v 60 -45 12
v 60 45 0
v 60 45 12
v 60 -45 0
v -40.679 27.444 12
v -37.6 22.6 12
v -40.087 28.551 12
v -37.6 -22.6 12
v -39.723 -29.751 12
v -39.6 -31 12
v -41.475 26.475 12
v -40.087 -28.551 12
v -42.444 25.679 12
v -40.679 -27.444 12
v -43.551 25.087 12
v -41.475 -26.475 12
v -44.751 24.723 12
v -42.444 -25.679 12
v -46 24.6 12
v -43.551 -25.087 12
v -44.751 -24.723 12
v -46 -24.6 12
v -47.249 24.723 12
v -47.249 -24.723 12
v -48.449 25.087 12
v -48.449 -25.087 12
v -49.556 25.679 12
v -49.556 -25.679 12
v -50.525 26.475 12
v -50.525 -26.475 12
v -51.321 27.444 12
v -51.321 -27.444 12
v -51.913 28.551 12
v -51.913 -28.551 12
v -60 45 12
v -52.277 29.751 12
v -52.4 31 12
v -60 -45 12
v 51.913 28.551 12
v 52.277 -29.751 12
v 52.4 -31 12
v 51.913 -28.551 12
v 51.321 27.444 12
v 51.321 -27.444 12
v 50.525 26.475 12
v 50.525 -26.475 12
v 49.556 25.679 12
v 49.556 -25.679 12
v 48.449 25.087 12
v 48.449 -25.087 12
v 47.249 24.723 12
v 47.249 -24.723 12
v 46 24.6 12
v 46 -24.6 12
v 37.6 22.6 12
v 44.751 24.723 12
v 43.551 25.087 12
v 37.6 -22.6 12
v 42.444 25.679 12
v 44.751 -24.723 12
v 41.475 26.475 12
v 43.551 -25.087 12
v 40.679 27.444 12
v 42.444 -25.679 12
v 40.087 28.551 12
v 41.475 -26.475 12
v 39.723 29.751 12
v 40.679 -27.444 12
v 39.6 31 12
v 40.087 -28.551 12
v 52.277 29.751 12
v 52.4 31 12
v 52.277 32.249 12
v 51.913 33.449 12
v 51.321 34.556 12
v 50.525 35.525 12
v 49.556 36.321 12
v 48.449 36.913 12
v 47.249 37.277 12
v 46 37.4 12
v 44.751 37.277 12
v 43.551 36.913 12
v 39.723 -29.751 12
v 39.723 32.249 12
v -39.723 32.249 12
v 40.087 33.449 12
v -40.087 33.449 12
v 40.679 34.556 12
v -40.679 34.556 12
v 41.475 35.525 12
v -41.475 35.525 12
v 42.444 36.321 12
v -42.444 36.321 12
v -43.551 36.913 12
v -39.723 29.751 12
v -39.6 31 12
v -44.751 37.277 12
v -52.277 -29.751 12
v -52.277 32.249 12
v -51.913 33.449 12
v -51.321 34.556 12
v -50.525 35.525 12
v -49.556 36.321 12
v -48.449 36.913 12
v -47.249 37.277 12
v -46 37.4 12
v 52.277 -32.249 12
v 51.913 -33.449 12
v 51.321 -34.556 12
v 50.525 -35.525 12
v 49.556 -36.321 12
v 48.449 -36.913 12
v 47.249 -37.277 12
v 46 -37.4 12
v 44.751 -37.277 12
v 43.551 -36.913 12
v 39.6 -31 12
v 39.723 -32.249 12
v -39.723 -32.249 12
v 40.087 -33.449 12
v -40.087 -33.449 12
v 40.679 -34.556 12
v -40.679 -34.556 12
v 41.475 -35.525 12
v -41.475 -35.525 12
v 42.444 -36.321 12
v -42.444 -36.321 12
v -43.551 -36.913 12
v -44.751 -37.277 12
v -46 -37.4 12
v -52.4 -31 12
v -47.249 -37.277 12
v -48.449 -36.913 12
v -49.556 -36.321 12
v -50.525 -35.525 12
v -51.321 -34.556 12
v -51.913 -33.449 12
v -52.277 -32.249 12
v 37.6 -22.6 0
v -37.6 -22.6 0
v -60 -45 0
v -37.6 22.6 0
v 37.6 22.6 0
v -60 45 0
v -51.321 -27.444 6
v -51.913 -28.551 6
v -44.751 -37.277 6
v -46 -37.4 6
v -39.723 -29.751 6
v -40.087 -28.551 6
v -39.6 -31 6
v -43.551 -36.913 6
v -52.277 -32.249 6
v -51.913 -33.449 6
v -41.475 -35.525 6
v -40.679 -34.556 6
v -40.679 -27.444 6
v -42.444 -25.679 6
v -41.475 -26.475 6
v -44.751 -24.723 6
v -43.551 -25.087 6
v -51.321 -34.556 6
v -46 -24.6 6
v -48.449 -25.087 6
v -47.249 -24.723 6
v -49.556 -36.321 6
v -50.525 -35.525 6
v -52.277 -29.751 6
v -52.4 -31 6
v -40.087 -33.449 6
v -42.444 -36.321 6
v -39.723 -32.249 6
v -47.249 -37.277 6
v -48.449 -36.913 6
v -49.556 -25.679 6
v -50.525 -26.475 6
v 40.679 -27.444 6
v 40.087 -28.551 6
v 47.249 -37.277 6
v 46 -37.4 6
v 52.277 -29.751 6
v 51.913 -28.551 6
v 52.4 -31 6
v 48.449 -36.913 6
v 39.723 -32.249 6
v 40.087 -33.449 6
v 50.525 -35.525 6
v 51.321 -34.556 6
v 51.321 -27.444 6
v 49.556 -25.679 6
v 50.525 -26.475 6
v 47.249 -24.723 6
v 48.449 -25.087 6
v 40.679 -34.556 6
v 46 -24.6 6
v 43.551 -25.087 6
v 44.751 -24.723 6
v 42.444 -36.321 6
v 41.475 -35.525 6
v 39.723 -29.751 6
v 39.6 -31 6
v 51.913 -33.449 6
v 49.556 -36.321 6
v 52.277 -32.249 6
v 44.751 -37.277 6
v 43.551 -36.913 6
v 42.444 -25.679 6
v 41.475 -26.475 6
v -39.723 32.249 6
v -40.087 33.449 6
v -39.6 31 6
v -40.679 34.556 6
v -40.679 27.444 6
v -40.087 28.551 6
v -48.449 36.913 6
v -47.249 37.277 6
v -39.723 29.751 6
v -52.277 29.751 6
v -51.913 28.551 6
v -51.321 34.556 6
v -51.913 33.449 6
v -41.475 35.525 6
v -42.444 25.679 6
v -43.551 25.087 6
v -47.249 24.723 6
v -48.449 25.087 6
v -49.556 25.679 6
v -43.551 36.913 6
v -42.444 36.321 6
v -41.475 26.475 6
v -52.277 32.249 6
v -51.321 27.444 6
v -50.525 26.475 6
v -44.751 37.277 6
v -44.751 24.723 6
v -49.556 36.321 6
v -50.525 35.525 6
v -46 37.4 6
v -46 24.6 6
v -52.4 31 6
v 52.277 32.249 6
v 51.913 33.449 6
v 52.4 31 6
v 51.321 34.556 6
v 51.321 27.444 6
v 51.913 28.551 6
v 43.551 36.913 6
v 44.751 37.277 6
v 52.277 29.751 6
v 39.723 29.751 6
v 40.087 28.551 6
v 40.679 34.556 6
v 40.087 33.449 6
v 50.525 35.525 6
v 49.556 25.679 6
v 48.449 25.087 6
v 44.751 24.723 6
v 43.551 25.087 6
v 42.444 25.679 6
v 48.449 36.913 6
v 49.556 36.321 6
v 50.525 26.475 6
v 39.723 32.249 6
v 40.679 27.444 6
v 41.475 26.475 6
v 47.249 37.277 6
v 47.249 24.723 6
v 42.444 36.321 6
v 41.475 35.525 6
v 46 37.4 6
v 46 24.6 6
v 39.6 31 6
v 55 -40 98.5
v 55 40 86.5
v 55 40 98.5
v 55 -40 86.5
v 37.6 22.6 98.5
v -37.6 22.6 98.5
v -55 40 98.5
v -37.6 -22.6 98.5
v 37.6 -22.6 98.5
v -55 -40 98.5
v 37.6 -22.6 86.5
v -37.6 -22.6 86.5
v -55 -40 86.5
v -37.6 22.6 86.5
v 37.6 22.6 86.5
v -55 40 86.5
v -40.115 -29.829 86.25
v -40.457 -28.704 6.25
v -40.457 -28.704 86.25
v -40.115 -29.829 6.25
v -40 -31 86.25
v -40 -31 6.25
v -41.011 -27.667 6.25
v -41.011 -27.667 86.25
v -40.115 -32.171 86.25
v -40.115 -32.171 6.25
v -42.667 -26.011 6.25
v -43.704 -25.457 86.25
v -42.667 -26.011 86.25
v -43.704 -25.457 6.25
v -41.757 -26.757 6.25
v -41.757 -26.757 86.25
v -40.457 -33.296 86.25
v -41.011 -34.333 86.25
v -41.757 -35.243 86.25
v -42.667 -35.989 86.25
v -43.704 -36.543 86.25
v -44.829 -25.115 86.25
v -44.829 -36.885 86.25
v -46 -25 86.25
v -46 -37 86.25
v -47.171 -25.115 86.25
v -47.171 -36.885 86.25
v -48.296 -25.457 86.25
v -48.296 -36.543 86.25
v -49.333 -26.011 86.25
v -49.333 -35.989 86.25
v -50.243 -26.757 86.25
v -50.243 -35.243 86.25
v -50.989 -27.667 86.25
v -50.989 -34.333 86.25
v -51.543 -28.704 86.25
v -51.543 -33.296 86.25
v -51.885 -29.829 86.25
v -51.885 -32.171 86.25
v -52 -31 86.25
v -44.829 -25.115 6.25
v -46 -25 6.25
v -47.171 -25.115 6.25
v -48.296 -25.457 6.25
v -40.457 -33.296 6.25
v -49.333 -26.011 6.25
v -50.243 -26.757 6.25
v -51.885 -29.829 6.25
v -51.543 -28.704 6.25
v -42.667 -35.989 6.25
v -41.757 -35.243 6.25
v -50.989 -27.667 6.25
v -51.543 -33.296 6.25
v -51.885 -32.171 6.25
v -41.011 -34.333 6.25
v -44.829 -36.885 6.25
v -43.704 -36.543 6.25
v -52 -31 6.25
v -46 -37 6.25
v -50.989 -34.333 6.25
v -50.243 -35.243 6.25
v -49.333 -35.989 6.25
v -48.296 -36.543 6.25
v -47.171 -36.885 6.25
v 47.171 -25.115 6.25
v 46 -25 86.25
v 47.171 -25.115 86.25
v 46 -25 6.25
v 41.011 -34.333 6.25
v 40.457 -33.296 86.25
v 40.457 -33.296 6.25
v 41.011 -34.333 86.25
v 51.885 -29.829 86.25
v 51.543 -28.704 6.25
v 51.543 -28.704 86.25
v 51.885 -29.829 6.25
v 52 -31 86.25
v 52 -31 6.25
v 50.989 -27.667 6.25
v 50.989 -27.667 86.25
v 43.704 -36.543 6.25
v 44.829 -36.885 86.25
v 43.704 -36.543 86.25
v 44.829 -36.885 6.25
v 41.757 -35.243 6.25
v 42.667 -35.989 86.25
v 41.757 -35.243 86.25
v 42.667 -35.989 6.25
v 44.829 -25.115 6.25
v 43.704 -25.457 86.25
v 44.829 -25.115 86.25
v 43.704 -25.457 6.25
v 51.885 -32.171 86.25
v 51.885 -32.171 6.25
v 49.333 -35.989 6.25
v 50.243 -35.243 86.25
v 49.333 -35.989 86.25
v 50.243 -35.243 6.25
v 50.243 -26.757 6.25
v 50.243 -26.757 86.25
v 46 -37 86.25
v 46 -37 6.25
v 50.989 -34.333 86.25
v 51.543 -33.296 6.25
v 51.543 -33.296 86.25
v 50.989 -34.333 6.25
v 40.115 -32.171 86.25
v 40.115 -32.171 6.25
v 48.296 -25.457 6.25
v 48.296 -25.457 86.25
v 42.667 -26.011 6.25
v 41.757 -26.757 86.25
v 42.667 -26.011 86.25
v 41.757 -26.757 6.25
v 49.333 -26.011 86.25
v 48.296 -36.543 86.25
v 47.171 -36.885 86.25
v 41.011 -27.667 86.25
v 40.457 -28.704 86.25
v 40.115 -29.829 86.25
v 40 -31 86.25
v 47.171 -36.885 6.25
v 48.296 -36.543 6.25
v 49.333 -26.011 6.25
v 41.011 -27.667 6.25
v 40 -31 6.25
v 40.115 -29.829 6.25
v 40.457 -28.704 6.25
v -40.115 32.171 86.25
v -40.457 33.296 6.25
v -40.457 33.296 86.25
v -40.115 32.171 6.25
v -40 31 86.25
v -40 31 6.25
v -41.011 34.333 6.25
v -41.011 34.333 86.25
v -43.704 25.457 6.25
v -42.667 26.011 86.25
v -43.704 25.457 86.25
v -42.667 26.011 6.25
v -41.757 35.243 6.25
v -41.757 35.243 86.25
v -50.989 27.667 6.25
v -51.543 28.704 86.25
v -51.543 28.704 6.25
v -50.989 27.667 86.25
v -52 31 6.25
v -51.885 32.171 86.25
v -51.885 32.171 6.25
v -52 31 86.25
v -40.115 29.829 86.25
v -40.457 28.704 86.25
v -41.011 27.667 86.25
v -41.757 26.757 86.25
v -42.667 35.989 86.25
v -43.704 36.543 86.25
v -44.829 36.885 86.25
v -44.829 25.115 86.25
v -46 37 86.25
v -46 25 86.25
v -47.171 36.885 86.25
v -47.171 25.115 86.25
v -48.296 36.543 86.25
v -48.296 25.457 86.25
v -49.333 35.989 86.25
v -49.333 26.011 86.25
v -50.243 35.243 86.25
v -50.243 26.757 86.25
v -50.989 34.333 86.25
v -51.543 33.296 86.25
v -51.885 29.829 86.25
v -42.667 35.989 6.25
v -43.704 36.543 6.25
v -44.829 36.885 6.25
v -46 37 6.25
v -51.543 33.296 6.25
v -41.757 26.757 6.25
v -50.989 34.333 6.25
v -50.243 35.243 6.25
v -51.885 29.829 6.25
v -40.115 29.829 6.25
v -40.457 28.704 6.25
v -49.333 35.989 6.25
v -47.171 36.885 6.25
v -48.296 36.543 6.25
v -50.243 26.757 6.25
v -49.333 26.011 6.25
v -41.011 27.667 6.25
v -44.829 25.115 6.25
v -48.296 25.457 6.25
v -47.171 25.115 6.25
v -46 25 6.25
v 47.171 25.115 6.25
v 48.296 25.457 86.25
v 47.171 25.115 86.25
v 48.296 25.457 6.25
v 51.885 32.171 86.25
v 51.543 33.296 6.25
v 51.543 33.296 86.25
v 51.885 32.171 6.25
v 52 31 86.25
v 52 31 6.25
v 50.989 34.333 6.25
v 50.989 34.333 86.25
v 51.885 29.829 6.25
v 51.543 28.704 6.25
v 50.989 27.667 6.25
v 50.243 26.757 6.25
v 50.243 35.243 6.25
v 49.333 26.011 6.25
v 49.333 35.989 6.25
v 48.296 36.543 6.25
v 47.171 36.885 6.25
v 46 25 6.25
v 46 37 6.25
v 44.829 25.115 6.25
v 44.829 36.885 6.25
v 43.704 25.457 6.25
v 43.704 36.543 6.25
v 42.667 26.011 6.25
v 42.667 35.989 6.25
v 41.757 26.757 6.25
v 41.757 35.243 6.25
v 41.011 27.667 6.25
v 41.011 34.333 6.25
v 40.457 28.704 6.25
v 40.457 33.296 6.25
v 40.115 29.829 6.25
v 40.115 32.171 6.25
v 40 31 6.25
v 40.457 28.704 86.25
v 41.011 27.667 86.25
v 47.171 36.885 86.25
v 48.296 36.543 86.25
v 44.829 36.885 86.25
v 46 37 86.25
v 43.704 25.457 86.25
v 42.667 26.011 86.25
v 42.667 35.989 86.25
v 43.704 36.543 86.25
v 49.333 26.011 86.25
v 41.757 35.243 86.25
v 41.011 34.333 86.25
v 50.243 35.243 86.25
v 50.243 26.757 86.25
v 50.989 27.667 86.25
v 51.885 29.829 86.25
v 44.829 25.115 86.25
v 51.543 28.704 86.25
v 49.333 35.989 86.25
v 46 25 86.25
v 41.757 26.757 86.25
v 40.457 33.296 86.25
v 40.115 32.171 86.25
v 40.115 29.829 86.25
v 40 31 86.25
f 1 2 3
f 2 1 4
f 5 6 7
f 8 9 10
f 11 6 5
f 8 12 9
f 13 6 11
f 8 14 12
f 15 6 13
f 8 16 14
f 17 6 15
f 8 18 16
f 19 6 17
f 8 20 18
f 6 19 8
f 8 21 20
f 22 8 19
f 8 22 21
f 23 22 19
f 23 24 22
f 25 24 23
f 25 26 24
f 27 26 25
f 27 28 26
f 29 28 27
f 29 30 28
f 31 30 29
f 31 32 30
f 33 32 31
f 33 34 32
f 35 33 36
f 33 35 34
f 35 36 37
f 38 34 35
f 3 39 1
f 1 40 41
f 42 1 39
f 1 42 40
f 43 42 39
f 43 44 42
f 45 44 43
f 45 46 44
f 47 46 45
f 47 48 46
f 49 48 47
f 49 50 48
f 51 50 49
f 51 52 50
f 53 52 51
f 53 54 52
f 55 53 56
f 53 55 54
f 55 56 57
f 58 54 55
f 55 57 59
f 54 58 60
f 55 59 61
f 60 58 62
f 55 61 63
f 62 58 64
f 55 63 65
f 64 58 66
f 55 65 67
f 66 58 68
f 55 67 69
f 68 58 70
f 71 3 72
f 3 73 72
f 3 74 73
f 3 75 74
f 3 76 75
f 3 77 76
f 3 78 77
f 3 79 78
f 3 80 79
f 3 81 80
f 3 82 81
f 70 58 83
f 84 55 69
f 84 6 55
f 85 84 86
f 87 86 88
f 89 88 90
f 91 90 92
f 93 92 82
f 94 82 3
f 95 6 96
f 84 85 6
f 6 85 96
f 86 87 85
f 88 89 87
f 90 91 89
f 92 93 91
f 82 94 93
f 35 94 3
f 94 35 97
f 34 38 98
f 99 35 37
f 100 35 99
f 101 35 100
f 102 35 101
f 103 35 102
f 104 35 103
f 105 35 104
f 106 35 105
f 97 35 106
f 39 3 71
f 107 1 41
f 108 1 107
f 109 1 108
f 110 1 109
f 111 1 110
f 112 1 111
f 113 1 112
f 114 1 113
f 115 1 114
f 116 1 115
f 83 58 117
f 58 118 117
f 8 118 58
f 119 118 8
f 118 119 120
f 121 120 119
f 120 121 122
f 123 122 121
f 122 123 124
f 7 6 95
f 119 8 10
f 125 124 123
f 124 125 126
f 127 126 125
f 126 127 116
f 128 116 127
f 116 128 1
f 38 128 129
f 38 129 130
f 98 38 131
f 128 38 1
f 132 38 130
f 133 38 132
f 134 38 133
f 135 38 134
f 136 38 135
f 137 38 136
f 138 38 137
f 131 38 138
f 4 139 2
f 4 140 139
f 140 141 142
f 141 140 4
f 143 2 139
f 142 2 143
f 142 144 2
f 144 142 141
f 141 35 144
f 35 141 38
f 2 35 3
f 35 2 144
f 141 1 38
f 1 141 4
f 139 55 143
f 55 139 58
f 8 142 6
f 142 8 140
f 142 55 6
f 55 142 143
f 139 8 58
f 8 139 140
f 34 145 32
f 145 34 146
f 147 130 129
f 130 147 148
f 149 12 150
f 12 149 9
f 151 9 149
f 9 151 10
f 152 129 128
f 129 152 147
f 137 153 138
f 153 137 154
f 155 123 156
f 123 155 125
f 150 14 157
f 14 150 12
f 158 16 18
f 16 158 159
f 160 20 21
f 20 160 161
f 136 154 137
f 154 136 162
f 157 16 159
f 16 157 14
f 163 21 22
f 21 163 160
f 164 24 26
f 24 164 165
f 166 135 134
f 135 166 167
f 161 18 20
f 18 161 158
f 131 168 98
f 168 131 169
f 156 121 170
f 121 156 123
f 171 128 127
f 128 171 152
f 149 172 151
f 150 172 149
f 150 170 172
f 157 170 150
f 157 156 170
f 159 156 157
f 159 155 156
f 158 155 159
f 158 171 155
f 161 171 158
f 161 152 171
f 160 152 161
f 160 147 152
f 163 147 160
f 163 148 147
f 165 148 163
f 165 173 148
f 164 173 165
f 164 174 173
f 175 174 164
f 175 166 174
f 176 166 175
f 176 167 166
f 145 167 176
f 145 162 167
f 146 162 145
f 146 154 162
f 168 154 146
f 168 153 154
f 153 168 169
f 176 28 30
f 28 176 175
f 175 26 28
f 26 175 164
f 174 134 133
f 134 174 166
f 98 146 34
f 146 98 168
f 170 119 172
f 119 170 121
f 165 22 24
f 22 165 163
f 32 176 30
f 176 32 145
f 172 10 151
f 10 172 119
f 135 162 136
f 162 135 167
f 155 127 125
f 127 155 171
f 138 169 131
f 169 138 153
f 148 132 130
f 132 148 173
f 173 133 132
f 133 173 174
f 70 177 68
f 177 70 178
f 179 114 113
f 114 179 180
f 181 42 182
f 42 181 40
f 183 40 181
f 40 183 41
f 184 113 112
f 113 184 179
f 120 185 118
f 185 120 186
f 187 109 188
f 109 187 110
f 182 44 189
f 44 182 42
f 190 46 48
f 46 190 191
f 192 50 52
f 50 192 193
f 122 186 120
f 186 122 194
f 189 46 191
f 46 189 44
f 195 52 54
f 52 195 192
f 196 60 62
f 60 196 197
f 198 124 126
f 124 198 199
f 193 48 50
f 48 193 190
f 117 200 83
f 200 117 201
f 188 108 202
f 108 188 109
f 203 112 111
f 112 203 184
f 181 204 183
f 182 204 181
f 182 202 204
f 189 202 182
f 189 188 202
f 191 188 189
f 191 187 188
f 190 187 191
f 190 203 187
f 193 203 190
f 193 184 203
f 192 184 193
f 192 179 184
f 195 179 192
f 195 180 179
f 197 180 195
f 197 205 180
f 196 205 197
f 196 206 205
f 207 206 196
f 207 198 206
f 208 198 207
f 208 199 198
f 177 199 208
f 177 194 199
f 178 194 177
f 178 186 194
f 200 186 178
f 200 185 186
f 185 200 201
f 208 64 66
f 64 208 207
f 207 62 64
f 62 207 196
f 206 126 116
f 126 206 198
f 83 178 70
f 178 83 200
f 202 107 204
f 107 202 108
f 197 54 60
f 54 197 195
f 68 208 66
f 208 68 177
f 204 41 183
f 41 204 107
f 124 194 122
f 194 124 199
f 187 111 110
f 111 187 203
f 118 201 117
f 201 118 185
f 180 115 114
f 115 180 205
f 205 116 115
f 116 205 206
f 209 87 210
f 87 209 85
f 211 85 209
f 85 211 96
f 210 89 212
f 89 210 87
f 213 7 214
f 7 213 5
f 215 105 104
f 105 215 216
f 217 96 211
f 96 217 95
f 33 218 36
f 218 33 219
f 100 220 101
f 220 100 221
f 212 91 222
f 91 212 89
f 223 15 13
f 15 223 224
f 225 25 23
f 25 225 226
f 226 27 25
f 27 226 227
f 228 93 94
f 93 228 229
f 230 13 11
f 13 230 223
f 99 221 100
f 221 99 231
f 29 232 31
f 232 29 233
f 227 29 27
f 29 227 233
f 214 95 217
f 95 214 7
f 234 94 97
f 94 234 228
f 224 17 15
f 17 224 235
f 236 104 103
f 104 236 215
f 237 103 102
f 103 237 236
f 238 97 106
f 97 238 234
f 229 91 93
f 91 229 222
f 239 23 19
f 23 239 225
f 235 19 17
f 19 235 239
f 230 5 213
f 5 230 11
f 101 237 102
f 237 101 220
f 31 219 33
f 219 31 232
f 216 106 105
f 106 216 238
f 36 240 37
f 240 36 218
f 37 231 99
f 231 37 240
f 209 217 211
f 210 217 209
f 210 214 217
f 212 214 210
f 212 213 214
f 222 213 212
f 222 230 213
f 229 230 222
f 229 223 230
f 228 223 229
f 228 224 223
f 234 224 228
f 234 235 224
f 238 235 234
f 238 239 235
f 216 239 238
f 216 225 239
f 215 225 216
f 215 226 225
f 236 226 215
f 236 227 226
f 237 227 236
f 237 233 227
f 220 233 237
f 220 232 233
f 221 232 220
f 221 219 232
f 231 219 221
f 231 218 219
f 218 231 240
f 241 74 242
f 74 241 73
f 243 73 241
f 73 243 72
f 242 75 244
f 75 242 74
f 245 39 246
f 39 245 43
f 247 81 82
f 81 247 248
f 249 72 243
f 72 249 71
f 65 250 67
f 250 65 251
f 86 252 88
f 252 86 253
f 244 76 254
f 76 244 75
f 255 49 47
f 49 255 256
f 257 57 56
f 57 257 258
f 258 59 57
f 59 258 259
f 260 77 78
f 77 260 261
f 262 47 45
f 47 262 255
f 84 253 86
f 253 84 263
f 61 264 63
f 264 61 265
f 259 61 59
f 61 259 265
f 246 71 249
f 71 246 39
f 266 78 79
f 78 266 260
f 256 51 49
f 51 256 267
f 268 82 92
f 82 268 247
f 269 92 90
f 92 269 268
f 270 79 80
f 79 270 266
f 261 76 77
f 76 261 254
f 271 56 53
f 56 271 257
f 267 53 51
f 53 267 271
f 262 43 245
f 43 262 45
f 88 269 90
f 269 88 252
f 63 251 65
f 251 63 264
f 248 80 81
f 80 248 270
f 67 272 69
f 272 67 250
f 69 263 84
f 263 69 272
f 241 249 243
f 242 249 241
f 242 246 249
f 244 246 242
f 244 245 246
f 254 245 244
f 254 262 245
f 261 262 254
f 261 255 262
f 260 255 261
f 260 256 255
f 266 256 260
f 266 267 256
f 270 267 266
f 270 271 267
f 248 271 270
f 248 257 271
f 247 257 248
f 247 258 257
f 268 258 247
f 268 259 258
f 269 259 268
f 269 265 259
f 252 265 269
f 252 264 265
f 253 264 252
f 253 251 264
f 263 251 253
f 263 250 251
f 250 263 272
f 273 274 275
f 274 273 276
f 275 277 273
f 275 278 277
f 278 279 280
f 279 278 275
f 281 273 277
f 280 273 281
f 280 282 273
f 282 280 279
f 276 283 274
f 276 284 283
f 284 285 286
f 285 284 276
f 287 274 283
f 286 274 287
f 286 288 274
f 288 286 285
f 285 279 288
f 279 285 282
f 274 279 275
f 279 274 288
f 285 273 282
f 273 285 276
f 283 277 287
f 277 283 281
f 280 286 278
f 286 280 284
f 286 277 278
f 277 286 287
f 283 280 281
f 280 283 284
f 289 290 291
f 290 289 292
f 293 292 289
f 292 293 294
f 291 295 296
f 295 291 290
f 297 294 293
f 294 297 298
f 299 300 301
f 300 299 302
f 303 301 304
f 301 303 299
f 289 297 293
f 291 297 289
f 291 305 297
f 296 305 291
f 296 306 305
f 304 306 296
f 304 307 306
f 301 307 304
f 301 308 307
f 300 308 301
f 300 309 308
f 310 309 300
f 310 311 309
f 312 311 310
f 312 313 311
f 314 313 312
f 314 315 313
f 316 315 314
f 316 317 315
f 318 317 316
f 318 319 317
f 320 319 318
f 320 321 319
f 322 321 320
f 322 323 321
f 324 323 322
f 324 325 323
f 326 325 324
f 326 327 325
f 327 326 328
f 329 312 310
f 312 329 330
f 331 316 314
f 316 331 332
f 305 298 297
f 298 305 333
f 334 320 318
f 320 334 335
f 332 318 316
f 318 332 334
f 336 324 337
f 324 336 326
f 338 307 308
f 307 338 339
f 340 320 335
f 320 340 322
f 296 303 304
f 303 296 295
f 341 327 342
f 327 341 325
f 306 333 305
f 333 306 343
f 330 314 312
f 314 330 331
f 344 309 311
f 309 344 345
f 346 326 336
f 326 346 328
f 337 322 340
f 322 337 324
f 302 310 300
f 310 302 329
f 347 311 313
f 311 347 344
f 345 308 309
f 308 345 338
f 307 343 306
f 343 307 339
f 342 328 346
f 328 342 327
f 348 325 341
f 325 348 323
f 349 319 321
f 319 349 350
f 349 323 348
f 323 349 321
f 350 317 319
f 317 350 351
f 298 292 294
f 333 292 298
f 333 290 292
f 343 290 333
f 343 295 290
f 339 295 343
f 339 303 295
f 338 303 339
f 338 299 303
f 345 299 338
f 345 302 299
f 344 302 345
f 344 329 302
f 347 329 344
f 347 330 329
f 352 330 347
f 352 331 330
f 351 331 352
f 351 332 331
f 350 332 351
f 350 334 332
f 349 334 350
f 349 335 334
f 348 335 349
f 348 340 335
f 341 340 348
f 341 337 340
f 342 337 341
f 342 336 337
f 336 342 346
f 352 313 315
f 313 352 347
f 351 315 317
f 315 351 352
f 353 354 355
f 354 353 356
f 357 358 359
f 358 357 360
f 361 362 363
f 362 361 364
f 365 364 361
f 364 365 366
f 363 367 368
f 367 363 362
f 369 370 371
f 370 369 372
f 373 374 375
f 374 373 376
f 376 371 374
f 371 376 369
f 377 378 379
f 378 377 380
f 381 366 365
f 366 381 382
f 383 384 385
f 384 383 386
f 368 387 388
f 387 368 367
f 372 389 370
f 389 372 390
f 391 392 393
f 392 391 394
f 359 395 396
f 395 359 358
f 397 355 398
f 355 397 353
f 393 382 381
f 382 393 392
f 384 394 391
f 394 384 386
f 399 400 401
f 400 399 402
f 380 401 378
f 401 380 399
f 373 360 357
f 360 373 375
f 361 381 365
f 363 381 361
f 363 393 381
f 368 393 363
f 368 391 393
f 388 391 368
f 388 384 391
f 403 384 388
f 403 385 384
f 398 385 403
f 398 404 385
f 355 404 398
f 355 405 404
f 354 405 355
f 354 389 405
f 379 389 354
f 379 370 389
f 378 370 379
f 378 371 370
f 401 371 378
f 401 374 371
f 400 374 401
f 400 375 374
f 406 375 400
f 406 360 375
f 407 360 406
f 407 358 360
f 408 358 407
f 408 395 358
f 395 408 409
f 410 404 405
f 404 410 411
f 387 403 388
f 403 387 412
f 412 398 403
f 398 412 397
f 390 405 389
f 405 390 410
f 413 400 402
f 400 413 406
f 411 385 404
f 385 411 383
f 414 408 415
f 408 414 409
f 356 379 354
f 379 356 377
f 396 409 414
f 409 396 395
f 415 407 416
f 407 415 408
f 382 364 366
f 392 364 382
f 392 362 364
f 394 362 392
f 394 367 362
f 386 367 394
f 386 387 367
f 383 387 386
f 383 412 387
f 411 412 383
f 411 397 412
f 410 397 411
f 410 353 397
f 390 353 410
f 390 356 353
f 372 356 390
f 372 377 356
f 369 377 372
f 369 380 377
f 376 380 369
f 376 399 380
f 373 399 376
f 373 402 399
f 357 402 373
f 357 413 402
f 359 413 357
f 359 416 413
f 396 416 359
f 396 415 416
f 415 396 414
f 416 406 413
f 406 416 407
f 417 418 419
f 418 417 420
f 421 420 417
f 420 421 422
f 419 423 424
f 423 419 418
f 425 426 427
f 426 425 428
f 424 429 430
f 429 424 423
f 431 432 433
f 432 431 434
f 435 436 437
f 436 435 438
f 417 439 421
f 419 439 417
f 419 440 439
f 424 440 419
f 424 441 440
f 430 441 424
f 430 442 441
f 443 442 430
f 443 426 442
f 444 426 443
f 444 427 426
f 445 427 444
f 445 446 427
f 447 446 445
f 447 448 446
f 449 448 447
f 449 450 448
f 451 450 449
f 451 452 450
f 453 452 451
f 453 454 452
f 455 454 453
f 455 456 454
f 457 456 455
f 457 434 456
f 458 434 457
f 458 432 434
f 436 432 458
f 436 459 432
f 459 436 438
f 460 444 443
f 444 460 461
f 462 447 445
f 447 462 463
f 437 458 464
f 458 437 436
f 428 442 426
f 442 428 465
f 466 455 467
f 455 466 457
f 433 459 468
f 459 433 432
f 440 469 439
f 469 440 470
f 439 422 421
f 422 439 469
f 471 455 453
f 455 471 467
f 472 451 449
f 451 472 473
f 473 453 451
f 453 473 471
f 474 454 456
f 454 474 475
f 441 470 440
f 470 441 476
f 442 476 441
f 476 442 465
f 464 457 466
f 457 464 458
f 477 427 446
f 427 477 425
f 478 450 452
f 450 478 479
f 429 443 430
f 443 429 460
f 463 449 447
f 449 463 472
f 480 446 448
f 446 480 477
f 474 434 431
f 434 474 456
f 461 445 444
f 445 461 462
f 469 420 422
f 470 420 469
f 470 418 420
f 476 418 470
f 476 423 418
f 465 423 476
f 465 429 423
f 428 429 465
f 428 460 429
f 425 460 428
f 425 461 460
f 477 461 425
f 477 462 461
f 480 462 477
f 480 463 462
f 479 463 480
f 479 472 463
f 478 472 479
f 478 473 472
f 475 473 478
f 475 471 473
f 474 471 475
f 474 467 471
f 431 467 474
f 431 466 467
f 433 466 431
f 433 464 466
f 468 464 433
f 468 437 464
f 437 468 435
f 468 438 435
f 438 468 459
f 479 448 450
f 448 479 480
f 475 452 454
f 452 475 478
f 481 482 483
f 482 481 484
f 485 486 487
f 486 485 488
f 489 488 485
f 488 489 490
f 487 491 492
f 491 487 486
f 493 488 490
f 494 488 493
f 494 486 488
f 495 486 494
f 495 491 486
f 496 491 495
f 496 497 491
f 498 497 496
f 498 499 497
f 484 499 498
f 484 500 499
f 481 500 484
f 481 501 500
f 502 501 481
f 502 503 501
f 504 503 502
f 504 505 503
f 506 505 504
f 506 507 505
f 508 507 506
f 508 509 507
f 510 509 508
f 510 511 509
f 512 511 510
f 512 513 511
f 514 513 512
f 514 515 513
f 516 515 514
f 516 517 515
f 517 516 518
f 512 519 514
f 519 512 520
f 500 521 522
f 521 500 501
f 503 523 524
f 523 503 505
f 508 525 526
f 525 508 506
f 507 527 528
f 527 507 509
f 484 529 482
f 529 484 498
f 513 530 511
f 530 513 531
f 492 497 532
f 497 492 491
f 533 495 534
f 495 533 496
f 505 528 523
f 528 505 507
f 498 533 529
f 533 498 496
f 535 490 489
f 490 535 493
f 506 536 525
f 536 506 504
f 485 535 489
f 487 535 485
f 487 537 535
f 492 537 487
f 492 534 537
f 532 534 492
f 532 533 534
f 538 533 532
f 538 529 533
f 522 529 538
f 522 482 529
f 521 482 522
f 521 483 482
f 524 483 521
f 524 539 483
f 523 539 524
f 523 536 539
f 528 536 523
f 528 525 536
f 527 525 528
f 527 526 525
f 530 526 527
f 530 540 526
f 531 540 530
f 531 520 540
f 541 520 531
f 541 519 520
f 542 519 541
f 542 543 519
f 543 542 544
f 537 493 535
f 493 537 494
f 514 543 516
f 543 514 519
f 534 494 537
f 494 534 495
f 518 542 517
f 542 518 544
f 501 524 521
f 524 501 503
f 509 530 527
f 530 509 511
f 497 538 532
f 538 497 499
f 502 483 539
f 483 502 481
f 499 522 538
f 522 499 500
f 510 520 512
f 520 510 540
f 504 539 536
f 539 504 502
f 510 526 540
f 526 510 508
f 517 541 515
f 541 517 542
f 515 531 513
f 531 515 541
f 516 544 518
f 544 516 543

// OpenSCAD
$fn = 32;

// ------------------------------------------------------------------------
// Frame cube: base 120 x 90 mm, posts 80 mm tall
// Every part is its own module, assembly() places every instance.
// ------------------------------------------------------------------------

// --- part 1 ---
module base_frame() {
  difference() {
    translate([-60, -45, 0]) cube([120, 90, 12]);
    translate([-37.6, -22.6, -1]) cube([75.2, 45.2, 14]);
    translate([-46, -31, 6]) cylinder(h = 7, d = 12.8);
    translate([46, -31, 6]) cylinder(h = 7, d = 12.8);
    translate([-46, 31, 6]) cylinder(h = 7, d = 12.8);
    translate([46, 31, 6]) cylinder(h = 7, d = 12.8);
  }
}

// --- part 2 ---
module corner_post() {
  cylinder(h = 80, d = 12);
}

// --- part 3 ---
module top_frame() {
  difference() {
    translate([-55, -40, 0]) cube([110, 80, 12]);
    translate([-37.6, -22.6, -1]) cube([75.2, 45.2, 14]);
  }
}

// --- assembly ---
module assembly() {
  color([0.80, 0.24, 0.20]) translate([0, 0, 0]) rotate([0, 0, 0]) base_frame();
  color([0.20, 0.45, 0.75]) translate([-46, -31, 6.25]) rotate([0, 0, 0]) corner_post();
  color([0.25, 0.62, 0.32]) translate([46, -31, 6.25]) rotate([0, 0, 0]) corner_post();
  color([0.92, 0.70, 0.18]) translate([-46, 31, 6.25]) rotate([0, 0, 0]) corner_post();
  color([0.58, 0.35, 0.70]) translate([46, 31, 6.25]) rotate([0, 0, 0]) corner_post();
  color([0.16, 0.66, 0.66]) translate([0, 0, 86.5]) rotate([0, 0, 0]) top_frame();
}

assembly();
